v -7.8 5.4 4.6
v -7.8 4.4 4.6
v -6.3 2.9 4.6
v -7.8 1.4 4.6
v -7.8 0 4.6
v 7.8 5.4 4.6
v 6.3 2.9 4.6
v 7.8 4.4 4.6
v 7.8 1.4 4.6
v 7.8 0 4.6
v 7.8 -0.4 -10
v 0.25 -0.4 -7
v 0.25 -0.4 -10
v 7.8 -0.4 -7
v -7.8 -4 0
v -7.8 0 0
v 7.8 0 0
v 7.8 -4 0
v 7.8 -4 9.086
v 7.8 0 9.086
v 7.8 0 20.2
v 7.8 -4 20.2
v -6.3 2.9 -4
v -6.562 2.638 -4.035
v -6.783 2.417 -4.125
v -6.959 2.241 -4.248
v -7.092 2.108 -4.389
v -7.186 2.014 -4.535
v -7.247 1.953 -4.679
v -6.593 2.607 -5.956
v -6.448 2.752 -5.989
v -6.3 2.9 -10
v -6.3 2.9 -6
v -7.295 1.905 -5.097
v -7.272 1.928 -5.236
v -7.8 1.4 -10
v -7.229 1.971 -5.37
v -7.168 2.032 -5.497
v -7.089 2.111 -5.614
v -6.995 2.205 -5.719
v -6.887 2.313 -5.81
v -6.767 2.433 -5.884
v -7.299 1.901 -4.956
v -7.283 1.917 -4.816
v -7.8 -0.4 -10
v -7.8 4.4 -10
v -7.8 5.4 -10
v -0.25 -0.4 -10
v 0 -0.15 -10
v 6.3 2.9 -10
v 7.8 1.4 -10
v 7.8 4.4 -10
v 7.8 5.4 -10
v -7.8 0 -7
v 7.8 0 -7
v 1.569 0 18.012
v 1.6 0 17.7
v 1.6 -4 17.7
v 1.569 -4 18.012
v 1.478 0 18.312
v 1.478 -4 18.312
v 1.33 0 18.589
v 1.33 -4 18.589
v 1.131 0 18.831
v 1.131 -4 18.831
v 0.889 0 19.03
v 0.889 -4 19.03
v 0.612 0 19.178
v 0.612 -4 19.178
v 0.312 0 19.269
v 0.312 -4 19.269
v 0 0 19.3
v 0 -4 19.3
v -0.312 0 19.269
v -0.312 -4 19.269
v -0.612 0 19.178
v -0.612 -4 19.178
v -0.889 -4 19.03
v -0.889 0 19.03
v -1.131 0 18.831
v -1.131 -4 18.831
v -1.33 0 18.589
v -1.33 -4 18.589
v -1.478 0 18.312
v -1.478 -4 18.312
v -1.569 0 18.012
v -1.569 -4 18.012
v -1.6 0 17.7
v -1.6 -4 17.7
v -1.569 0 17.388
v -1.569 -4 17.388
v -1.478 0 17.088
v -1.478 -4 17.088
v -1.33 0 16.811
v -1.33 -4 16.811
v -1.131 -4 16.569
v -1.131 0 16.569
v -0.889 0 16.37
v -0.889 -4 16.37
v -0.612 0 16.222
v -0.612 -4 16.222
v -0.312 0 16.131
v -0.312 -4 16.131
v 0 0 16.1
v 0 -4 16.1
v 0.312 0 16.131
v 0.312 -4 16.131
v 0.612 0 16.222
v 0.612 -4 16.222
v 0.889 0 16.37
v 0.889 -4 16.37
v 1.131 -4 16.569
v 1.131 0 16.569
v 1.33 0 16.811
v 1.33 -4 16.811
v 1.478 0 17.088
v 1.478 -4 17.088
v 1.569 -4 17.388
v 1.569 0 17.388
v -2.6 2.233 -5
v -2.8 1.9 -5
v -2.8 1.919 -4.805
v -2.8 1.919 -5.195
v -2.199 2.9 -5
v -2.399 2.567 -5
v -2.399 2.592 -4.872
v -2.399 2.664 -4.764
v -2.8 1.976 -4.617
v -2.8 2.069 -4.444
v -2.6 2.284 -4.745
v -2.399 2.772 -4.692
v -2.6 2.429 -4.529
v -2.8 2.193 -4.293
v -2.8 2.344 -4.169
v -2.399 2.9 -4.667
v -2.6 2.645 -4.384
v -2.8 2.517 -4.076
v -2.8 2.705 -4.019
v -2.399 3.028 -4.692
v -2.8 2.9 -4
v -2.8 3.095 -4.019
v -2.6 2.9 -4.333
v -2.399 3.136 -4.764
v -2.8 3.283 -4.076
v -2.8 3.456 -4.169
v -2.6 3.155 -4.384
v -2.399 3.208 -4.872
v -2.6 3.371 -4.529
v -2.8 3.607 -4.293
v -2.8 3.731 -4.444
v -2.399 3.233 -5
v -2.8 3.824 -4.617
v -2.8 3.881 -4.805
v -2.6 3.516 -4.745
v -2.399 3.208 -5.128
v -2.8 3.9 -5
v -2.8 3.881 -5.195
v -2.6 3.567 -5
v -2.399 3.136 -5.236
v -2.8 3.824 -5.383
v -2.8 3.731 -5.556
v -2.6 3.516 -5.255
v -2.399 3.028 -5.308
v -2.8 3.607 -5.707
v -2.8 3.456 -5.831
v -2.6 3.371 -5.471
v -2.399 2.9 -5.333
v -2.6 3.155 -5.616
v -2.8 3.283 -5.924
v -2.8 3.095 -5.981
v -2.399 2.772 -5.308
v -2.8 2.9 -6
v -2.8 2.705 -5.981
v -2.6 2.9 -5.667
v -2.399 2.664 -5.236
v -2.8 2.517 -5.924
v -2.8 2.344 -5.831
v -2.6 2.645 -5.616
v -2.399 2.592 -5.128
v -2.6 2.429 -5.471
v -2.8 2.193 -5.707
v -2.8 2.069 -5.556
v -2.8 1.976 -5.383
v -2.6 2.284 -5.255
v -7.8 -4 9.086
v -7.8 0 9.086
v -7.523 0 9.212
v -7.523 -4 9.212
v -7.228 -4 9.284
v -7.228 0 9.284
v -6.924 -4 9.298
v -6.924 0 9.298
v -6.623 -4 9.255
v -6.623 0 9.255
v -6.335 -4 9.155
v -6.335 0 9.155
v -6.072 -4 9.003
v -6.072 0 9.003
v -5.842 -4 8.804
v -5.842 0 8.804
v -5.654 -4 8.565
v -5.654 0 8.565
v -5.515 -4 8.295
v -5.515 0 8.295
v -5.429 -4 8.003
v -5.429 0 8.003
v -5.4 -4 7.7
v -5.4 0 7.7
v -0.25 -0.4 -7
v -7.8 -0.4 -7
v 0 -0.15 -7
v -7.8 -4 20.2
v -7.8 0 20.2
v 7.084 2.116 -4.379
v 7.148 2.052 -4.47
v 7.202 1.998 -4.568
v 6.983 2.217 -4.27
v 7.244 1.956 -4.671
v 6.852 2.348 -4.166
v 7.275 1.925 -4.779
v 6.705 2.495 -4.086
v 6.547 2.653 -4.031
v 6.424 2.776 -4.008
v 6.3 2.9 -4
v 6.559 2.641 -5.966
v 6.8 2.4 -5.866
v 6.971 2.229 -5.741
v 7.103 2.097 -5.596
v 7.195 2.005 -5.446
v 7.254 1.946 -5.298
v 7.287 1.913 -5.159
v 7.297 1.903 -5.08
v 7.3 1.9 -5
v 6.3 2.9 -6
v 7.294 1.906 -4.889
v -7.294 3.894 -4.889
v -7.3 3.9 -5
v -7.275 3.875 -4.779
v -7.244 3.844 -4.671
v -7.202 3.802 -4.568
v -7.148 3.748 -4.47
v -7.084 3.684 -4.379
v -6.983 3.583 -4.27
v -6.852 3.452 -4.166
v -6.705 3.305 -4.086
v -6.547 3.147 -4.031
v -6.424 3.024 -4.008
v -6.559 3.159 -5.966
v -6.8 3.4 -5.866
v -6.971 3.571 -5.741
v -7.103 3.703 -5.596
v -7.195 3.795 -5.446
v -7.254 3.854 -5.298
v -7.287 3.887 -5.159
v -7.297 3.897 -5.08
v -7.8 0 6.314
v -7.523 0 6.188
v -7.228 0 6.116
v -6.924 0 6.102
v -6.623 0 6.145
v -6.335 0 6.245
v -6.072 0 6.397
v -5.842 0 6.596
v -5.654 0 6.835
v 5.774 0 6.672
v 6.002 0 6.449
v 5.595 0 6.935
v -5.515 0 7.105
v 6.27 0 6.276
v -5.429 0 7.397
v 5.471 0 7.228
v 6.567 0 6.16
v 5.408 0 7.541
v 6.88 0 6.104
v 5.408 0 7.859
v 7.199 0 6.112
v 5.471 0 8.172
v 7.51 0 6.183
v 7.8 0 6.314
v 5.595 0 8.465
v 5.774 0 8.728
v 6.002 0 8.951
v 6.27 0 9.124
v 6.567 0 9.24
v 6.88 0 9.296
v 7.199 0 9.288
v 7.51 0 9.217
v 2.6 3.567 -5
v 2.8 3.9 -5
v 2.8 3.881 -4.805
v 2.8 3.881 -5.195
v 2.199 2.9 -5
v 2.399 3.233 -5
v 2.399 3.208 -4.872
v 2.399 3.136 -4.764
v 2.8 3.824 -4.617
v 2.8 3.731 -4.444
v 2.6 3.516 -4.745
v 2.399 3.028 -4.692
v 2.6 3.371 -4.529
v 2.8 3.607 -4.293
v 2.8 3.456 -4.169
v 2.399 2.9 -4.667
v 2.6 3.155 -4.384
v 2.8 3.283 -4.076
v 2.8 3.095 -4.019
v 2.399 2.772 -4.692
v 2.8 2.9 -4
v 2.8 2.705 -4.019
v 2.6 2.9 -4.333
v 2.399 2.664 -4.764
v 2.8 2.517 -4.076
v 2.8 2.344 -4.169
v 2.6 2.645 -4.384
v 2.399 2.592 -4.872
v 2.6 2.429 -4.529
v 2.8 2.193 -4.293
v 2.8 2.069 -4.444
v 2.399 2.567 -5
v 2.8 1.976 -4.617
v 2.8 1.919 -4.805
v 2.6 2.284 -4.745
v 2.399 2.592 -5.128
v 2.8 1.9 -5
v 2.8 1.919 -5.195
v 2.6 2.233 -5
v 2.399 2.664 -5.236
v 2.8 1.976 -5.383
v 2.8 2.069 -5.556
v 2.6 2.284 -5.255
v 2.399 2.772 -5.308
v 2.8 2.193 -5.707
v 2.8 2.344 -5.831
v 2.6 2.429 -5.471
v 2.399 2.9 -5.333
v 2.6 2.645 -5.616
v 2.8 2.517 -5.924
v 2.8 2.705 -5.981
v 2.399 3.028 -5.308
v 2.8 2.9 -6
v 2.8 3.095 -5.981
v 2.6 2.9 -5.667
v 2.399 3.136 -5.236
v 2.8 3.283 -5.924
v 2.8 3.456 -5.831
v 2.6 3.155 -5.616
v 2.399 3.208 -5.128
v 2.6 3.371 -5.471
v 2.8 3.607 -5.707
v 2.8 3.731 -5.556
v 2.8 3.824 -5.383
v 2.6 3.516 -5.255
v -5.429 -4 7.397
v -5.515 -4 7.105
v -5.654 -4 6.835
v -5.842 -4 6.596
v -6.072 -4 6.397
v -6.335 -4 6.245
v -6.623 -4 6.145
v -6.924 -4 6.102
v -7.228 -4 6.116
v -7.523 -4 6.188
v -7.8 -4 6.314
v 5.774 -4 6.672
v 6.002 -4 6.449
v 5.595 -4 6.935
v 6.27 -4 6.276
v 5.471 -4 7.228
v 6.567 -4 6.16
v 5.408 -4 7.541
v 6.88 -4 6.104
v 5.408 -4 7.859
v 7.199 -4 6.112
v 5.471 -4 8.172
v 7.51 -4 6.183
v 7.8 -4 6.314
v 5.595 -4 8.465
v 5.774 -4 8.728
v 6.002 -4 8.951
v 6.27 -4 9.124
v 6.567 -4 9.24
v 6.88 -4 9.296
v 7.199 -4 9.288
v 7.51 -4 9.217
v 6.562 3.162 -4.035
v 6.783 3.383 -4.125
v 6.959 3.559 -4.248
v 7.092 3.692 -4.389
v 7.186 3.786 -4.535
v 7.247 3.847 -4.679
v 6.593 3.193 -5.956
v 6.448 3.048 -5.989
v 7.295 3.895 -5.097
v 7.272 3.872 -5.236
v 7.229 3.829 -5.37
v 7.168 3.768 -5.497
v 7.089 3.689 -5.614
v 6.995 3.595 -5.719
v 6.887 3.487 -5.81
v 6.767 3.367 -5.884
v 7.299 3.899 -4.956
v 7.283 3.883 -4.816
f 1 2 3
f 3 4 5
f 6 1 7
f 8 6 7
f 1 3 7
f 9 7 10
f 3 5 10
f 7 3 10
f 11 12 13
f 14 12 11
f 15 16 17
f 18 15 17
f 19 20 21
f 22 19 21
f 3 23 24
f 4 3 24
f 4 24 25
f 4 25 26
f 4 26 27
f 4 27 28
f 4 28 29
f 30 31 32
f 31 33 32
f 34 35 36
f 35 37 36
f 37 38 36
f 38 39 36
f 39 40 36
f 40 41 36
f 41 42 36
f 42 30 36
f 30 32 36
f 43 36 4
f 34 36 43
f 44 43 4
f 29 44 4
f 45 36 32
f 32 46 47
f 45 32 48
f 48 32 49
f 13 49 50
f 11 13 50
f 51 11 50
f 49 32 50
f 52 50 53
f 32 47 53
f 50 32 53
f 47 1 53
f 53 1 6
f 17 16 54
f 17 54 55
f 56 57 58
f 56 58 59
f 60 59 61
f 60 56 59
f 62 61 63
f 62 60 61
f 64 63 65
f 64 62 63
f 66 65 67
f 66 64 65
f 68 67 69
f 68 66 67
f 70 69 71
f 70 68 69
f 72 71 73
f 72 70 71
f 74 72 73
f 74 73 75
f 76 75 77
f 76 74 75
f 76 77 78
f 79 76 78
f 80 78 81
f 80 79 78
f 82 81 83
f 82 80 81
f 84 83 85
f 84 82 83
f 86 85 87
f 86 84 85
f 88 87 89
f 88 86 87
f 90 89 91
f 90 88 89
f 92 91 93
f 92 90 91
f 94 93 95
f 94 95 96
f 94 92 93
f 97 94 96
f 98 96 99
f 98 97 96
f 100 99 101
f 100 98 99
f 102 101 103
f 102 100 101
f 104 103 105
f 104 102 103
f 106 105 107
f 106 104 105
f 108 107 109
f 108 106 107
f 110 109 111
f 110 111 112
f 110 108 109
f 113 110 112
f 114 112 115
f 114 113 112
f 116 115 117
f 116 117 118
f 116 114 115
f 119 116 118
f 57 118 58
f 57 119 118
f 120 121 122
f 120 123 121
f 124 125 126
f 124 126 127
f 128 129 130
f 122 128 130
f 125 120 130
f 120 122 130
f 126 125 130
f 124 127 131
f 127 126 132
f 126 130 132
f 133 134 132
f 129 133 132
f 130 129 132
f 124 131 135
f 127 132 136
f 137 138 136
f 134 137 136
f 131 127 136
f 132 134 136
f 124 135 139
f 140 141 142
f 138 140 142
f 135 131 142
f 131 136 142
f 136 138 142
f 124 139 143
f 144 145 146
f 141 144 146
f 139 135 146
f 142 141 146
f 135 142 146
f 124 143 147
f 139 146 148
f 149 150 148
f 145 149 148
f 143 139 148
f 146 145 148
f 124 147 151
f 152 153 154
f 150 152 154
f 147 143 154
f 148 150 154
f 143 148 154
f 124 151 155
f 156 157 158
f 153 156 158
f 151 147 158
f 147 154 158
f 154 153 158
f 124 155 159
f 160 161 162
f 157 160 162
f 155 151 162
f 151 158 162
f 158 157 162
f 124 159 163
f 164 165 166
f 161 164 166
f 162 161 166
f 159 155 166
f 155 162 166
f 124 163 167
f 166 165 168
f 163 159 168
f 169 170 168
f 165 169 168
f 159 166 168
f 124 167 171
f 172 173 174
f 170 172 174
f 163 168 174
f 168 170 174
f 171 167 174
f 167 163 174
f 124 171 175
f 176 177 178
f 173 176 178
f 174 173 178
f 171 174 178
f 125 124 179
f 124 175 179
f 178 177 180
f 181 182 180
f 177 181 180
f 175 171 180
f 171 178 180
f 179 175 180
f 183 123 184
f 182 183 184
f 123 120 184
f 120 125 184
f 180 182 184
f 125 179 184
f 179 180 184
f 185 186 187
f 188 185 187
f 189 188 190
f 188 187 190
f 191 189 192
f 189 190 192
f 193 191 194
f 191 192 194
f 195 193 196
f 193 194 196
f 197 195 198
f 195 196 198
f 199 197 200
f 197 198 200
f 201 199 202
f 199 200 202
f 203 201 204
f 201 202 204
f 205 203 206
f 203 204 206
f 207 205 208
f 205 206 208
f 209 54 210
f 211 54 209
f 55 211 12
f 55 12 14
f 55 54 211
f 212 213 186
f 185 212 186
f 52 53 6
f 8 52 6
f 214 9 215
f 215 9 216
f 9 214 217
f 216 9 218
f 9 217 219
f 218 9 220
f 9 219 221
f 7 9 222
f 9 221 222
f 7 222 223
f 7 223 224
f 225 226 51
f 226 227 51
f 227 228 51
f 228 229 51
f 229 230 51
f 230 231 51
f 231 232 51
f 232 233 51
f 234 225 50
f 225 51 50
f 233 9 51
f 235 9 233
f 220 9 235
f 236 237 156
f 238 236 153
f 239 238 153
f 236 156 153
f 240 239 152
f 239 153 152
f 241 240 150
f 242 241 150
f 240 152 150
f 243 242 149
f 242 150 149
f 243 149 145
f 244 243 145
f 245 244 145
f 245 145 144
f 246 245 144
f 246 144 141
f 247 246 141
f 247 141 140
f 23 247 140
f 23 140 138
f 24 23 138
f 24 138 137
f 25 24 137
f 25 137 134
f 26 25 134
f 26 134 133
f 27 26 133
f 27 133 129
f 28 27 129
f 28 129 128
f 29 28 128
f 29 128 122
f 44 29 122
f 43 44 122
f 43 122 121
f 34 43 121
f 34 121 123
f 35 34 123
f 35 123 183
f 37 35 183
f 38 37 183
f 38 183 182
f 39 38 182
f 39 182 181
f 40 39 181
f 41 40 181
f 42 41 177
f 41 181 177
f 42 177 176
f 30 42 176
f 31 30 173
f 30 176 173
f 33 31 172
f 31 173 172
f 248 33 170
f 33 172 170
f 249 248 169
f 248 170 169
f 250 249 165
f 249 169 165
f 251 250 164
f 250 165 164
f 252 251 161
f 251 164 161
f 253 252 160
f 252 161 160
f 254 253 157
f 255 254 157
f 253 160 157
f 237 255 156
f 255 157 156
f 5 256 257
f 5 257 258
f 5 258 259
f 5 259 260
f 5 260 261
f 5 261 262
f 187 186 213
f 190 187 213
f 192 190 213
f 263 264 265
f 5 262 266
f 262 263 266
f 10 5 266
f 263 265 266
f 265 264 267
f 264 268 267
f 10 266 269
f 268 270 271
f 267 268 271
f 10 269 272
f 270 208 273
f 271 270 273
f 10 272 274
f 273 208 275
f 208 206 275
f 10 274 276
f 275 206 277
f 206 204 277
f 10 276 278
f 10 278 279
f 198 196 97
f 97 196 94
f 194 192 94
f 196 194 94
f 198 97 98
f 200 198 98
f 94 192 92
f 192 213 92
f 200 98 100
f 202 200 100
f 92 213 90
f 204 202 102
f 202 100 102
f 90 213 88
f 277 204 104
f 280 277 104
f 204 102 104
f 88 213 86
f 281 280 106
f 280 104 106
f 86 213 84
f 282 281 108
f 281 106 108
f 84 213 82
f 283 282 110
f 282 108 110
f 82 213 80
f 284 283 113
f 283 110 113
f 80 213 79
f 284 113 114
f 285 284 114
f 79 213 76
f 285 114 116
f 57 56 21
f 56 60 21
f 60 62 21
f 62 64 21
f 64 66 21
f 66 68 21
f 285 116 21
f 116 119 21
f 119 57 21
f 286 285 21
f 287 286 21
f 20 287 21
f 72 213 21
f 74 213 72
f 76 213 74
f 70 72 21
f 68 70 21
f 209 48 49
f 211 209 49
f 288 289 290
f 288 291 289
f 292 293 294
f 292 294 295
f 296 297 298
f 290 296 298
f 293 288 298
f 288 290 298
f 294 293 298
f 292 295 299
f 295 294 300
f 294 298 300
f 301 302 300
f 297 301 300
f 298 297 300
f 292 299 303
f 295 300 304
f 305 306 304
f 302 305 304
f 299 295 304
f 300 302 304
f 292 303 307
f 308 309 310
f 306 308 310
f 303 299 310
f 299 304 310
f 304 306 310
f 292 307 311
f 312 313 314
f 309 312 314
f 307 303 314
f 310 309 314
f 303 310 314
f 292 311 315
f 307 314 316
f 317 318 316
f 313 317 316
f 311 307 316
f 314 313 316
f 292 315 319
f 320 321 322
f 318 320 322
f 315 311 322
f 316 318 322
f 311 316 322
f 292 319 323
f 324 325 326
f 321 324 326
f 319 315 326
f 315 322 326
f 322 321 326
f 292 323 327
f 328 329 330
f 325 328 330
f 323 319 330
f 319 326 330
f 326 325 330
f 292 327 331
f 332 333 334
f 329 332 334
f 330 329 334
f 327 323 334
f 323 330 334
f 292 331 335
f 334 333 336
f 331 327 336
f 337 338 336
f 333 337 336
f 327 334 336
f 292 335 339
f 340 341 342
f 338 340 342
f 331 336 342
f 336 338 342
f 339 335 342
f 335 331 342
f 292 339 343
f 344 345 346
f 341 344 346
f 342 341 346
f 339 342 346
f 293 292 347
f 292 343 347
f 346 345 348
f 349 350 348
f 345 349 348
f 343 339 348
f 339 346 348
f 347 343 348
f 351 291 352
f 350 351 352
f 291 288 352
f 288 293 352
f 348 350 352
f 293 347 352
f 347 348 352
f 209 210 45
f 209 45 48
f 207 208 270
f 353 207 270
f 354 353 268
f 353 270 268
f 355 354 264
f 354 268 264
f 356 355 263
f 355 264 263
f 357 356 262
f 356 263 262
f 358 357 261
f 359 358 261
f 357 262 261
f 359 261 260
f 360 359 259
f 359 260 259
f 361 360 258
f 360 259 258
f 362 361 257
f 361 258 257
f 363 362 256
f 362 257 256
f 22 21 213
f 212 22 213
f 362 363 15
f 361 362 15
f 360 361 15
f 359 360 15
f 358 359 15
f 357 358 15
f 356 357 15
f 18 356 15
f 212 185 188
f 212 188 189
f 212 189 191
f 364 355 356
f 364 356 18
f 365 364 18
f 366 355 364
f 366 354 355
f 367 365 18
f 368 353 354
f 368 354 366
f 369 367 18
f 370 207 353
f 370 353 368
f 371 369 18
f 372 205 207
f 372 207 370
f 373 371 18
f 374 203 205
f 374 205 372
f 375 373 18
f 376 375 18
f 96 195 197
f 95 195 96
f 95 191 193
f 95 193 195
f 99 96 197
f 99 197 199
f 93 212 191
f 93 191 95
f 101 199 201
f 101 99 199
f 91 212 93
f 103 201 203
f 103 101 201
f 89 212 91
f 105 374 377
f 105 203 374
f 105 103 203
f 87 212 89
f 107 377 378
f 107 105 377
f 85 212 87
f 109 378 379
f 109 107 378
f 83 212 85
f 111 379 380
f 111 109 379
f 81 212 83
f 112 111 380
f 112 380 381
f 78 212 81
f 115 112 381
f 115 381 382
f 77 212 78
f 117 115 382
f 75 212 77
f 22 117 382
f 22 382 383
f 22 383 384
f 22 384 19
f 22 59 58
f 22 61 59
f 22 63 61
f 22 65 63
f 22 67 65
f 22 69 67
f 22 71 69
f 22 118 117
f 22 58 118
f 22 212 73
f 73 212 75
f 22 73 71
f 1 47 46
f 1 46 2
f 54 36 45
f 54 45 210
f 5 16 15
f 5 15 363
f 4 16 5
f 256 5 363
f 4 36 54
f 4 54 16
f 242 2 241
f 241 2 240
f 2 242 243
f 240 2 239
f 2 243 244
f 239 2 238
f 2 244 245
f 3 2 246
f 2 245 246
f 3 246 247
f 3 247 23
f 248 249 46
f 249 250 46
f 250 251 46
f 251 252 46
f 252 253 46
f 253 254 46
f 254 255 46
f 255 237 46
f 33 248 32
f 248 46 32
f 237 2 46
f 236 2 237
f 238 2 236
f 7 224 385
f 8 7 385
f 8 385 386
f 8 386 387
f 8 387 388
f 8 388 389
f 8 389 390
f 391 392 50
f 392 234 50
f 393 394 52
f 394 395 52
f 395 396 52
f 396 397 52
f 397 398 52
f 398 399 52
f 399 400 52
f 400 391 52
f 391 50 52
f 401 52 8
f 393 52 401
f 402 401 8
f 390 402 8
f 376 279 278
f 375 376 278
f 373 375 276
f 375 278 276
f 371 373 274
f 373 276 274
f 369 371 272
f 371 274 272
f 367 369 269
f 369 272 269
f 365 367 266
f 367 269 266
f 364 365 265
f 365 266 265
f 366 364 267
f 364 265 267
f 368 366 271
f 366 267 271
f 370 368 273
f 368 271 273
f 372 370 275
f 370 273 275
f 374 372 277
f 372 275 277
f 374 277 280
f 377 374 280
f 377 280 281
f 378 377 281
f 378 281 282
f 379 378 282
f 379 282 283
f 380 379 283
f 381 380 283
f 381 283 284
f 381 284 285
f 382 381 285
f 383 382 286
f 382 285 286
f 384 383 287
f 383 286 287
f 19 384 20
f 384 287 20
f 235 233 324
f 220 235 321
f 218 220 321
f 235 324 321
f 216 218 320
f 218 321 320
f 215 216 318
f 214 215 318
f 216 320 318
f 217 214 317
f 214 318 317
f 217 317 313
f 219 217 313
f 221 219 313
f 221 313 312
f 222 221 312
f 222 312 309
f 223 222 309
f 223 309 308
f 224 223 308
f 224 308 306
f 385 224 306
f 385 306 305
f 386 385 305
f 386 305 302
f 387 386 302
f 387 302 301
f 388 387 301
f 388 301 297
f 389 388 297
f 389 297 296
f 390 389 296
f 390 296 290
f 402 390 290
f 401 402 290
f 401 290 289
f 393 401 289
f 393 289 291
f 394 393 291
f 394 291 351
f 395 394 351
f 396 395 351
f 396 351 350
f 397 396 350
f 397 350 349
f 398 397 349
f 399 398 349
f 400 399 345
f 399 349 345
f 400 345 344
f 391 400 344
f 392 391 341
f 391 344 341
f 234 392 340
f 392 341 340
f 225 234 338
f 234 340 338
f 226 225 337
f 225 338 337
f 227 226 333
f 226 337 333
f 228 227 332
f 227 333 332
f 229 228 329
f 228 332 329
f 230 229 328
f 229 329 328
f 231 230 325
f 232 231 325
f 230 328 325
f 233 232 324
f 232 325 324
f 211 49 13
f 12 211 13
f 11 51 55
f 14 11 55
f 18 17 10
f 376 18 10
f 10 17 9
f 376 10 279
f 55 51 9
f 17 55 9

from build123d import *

# Parameters (mm, degrees)
F0_R           = 1.6
F1_DEPTH       = 4
F2_W           = 15.6
F2_H           = 14.6
F3_DEPTH       = 5.4
F4_W           = 15.6
F4_H           = 3
F5_DEPTH       = 0.4
F8_D           = 2
F8_DEPTH       = 5
F8_TIP         = 0.600860619
F8_ON_F7_D     = 2
F8_ON_F7_DEPTH = 5
F8_ON_F7_TIP   = 0.600860619
F10_DEPTH      = 25
F12_DEPTH      = 3


with BuildPart() as f1:
    # F0 (on Front) → F1 (new body)
    with BuildSketch(Plane.XZ):
        with BuildLine():
            Line((-7.8, 6.3143593539), (-7.8, 0))
            Line((-7.8, 0), (7.8, 0))
            Line((7.8, 0), (7.8, 6.3143593539))
            ThreePointArc((7.8, 6.3143593539), (5.4, 7.7), (7.8, 9.0856406461))
            Line((7.8, 9.0856406461), (7.8, 20.2))
            Line((7.8, 20.2), (-7.8, 20.2))
            Line((-7.8, 20.2), (-7.8, 9.0856406461))
            ThreePointArc((-7.8, 9.0856406461), (-6.2, 9.0856406461), (-5.4, 7.7))
            ThreePointArc((-5.4, 7.7), (-6.2, 6.3143593539), (-7.8, 6.3143593539))
        make_face()
        with Locations((0, 17.7)):
            Circle(F0_R, mode=Mode.SUBTRACT)
    extrude(amount=F1_DEPTH)

    # F2 (on Front) → F3 (join)
    with BuildSketch(Plane.XZ):
        with Locations((0, -2.7)):
            Rectangle(F2_W, F2_H)
    extrude(amount=-F3_DEPTH)

    # F4 (on face) → F5 (join)
    with BuildSketch(Plane.XZ):
        with Locations((0, -8.5)):
            Rectangle(F4_W, F4_H)
    extrude(amount=F5_DEPTH)

    # F8
    with Locations(Plane.YZ.offset(7.8)):
        with Locations((2.9, -5)):
            Hole(F8_D / 2, depth=F8_DEPTH)
            with Locations((0, 0, -(F8_DEPTH + F8_TIP / 2))):  # 118° drill point
                Cone(0, F8_D / 2, F8_TIP, mode=Mode.SUBTRACT)

    # F8 on F7
    with Locations(Plane(origin=(-7.8, 0, 0), x_dir=(0, -1, 0), z_dir=(-1, 0, 0))):
        with Locations((-2.9, -5)):
            Hole(F8_ON_F7_D / 2, depth=F8_ON_F7_DEPTH)
            with Locations((0, 0, -(F8_ON_F7_DEPTH + F8_ON_F7_TIP / 2))):  # 118° drill point
                Cone(0, F8_ON_F7_D / 2, F8_ON_F7_TIP, mode=Mode.SUBTRACT)

    # F9 (on face) → F10 (cut)
    with BuildSketch(Plane(origin=(0, 0, -10), x_dir=(1, 0, 0), z_dir=(0, 0, -1))):
        Polygon((-6.3, -2.9), (-7.8, -1.4), (-7.8, -4.4), align=None)
        Polygon((7.8, -4.4), (7.8, -1.4), (6.3, -2.9), align=None)
    extrude(amount=-F10_DEPTH, mode=Mode.SUBTRACT)

    # F11 (on face) → F12 (cut, through all)
    with BuildSketch(Plane(origin=(0, 0, -10), x_dir=(1, 0, 0), z_dir=(0, 0, -1))):
        Polygon((-0.25, 0.4), (0, 0.15), (0.25, 0.4), align=None)
    extrude(amount=-F12_DEPTH, mode=Mode.SUBTRACT)


solid = f1.part
